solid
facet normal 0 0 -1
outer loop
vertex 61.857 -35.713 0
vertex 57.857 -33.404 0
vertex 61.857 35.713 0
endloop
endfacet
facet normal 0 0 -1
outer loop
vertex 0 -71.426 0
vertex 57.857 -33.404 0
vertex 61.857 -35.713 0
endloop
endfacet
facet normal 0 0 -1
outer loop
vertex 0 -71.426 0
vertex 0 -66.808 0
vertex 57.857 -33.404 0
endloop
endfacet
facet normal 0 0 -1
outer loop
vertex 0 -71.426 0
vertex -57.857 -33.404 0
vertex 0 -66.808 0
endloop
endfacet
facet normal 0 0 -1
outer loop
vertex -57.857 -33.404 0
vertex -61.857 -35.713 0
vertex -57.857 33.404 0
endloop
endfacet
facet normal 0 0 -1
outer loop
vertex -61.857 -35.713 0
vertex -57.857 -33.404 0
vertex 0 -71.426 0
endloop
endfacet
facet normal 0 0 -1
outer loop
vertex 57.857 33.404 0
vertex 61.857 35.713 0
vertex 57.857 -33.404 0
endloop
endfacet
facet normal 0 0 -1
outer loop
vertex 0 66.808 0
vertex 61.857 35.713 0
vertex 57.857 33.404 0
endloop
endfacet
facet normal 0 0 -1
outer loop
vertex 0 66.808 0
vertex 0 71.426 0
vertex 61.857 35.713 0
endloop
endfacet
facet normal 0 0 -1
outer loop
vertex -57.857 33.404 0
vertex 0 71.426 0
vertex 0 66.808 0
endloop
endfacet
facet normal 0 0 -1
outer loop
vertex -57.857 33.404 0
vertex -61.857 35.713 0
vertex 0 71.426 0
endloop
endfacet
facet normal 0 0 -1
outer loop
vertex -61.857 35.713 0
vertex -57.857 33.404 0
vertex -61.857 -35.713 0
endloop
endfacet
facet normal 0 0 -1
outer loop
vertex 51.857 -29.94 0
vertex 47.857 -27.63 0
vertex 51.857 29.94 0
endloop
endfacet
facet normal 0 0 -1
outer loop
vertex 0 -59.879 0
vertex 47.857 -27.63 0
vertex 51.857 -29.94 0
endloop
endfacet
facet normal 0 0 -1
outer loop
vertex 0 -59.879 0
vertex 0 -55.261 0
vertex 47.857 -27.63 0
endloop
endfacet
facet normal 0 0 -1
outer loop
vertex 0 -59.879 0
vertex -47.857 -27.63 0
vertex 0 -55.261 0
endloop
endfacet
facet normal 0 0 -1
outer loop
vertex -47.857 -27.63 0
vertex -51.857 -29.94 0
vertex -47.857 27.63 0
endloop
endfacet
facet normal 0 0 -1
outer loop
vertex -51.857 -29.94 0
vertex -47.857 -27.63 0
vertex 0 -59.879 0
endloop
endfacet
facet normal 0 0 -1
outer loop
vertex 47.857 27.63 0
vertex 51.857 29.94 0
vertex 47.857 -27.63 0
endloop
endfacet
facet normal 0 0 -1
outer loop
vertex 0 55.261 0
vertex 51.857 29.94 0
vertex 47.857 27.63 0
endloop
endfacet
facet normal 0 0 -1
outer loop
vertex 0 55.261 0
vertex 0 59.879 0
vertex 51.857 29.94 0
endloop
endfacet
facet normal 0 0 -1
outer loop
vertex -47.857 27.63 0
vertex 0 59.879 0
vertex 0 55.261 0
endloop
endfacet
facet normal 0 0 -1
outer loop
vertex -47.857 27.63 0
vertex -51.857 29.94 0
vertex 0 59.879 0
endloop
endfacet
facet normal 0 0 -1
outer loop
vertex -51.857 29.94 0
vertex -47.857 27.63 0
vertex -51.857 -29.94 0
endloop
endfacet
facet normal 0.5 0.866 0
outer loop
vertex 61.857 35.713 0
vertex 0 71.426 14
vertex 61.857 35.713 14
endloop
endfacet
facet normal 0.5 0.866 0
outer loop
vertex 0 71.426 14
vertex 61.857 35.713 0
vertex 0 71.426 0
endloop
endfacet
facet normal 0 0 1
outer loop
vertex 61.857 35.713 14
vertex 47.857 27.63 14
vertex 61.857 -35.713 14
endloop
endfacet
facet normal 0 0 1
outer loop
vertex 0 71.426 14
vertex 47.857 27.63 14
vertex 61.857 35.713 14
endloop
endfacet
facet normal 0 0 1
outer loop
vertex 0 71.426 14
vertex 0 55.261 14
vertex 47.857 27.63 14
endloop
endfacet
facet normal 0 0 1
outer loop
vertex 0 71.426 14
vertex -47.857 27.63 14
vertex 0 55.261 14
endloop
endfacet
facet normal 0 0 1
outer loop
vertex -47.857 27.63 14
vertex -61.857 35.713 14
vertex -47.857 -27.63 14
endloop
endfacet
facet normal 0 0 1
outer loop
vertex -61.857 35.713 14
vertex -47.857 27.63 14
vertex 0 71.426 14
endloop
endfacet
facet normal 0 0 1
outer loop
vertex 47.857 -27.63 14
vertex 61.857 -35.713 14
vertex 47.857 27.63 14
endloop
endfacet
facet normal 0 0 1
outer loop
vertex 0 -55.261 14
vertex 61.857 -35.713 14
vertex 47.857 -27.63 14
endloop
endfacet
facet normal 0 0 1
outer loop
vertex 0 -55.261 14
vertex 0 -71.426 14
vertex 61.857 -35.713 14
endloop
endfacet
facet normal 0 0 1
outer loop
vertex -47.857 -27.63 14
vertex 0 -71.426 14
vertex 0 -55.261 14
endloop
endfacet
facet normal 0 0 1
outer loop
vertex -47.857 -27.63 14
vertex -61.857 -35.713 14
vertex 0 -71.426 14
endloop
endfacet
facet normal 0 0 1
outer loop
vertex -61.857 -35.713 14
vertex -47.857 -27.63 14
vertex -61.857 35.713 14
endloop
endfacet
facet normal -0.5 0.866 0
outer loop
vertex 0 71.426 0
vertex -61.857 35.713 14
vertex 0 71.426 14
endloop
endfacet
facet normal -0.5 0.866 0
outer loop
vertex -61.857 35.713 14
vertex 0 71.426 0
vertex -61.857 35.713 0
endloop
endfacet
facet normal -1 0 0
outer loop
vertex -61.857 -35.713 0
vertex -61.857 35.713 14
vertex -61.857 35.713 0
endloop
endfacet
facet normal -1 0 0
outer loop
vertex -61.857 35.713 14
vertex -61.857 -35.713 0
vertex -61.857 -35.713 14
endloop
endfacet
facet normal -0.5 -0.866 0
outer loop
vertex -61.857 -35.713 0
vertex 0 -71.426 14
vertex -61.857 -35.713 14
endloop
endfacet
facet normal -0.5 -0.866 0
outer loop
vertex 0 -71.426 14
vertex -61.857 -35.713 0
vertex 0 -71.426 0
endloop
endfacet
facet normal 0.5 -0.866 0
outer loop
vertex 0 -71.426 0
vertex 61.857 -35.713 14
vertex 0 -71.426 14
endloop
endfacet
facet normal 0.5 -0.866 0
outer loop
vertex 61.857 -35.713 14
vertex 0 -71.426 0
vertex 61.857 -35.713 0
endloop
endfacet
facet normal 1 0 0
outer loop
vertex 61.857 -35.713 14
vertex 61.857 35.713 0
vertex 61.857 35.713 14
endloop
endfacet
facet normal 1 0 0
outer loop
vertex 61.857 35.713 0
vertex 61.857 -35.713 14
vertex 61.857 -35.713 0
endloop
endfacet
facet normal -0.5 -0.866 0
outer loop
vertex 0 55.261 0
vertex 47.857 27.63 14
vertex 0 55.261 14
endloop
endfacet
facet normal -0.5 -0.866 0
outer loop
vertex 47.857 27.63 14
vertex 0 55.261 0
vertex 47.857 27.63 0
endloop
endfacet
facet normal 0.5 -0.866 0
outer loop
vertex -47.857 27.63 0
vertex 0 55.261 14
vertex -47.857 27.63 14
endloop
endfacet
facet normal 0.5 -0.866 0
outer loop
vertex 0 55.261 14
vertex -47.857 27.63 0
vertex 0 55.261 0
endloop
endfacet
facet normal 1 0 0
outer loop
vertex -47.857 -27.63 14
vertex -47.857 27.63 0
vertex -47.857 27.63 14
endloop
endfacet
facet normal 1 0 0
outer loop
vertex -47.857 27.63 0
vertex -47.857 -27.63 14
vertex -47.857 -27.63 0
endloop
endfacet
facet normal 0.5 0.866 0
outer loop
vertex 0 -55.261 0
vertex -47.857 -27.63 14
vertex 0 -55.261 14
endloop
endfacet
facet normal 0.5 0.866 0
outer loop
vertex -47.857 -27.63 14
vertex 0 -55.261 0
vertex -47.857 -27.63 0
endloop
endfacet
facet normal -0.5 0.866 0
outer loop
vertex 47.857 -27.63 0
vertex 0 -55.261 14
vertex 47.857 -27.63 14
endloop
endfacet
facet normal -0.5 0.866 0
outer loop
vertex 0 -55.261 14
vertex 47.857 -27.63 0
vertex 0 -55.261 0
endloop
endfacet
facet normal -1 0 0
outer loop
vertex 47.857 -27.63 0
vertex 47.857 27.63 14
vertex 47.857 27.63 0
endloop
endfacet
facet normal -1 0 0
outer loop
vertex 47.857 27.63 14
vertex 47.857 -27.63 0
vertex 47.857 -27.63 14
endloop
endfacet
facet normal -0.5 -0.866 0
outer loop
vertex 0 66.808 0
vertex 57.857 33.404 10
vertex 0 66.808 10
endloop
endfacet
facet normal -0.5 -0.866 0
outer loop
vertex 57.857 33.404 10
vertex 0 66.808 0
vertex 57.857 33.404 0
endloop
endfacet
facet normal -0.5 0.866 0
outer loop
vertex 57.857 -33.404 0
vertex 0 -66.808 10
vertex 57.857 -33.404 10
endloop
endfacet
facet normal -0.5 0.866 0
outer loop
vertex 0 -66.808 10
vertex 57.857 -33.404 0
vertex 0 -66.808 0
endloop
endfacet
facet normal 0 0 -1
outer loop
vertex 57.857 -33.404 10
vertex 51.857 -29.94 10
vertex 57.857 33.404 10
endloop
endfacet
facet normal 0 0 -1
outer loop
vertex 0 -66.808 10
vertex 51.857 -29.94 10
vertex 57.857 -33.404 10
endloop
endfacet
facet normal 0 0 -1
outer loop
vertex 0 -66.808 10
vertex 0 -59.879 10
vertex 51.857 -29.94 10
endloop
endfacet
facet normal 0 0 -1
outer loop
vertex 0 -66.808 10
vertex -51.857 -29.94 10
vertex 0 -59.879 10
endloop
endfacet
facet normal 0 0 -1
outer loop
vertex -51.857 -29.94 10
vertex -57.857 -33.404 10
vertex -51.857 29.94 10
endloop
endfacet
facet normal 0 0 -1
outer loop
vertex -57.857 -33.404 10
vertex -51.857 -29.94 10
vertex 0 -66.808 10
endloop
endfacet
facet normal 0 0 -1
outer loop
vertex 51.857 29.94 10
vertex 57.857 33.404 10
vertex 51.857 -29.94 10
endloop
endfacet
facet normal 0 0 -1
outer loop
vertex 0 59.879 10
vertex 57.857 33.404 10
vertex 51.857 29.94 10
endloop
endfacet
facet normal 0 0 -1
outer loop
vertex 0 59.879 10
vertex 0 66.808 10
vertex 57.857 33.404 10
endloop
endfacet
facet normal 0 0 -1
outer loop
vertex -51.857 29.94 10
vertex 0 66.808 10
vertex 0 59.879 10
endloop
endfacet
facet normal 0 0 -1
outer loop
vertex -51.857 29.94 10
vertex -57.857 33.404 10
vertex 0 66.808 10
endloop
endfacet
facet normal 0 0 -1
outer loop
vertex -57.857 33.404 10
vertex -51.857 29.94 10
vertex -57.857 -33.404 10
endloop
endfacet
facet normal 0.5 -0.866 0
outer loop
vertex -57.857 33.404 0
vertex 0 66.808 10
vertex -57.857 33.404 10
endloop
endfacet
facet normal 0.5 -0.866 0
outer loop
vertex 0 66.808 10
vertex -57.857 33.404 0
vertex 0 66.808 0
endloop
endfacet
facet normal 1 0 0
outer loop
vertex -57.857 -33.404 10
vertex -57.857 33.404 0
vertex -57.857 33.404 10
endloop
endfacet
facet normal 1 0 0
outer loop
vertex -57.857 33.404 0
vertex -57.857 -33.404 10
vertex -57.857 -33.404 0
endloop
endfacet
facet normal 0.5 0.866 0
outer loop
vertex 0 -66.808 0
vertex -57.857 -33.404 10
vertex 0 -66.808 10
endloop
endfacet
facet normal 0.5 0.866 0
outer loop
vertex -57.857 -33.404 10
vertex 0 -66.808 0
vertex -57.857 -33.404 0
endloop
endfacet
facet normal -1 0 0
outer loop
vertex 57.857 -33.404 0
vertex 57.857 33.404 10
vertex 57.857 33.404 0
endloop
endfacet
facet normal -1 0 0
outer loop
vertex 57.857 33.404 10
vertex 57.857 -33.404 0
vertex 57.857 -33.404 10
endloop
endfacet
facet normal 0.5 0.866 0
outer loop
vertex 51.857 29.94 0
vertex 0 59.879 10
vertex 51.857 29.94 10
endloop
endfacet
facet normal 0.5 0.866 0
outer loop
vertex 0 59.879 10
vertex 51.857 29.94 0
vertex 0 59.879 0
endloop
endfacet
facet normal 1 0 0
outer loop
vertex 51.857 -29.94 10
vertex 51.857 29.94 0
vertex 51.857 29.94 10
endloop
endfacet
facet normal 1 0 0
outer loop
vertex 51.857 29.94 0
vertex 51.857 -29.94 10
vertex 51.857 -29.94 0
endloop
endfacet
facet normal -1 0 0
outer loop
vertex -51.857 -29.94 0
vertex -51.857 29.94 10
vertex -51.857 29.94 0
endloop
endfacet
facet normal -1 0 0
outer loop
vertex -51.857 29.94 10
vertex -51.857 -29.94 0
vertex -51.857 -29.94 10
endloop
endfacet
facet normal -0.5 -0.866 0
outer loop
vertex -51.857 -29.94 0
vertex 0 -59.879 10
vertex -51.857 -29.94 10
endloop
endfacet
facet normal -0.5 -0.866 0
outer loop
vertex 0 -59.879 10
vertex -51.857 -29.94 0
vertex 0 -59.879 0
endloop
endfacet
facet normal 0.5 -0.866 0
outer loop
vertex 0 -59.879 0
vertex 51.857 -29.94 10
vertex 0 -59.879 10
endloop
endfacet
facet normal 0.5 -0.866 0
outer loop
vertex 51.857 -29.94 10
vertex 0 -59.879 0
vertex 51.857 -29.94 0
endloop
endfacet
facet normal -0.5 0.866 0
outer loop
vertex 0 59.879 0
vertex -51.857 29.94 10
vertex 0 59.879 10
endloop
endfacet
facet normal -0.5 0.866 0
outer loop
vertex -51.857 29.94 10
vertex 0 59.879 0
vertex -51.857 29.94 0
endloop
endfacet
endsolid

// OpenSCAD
// file: lib/honeycomb.scad
/*
Author: Daniel <headbulb>
Small library to create a repeating honeycomb pattern around center hex grid
*/





module hexagon2d(initialangle=0, radius=1) {
polygon(points=[[radius*cos(initialangle),radius*sin(initialangle)],
				[radius*cos(initialangle+60),radius*sin(initialangle+60)],
				[radius*cos(initialangle+120),radius*sin(initialangle+120)],
				[radius*cos(initialangle+180),radius*sin(initialangle+180)],
				[radius*cos(initialangle+240),radius*sin(initialangle+240)],
				[radius*cos(initialangle+300),radius*sin(initialangle+300)]]);
}
// Number of cells = 1+summation(start=1, end=boundry, 6*n)
module hexagongrid(height=1, boundry=1, outerhexradius=1, innerhexradius=0.9, orientation=0, inneronly=true ) {
for (i = [-(boundry) : 1 :boundry ] ){
    for(j = [-(boundry) : 1 : boundry ]){
            z = -(i+j);
            if(z<boundry+1 && z>-(boundry+1)){
             //   echo("i:", i, "j:", j, "z:", z);
                x1 = outerhexradius*(i*cos(300+orientation)+j*cos(60+orientation)+z*cos(180+orientation));
                y1 = outerhexradius*(i*sin(300+orientation)+j*sin(60+orientation)+z*sin(180+orientation));
				if(inneronly==true){
					//color([abs(i)/5,abs(j)/5,abs(z)/5])
					translate([x1,y1,0])
					linear_extrude(height=height) 
					 hexagon2d(initialangle=orientation, radius=innerhexradius);
				}
				else {
						difference() {
							//color([abs(i)/5,abs(j)/5,abs(z)/5])
							translate([x1,y1,0])
							linear_extrude(height=height) 
							 hexagon2d(initialangle=orientation, radius=outerhexradius);
							translate([x1,y1,0])linear_extrude(height=height)
							 hexagon2d(initialangle=orientation, radius=innerhexradius);
					}
				
				}
            } //if Z
    }// for j
}// for i
}


// Find the radius of the outerhex. Basically find an edge hex center then two vectors from that point. 
// One vector to the corner, second vector a little outside that. A 120-30-30 or 30-60-90 triangle
function adj(s) = s/2;
function hyp(s) = adj(s)/cos(30);
function x2(s, boundry) = s*((boundry)*cos(0)-(boundry)*cos(240))+s*cos(60)+hyp(s)*cos(330);
function y2(s, boundry) = s*((boundry)*sin(0)-(boundry)*sin(240))+s*sin(60)+hyp(s)*sin(330);
function outerhexradius(s, boundry) = sqrt((x2(s, boundry)*x2(s, boundry)+y2(s, boundry)*y2(s, boundry)));
//outerhex=sqrt((x2*x2+y2*y2));
// main file
$fn = $preview ? 10 : 100;

include <lib/honeycomb.scad>

D = 10;
W = 810;
H = 542;

count_x = 7;
count_y = 5;

T = 12;

ohr = W/count_x/cos(30)/2;
delta_r = T/cos(30)/2;
ihr = ohr - delta_r;

jig_t = 4;
jig_r = jig_t/cos(30);

module grid() {
    difference() {
        union() {
            difference() {
                translate([-W/2,-H/2,0]) cube([W,H,D]);
                hexagongrid(height = D, boundry = max(count_x,count_y), outerhexradius = ohr, innerhexradius = ihr, orientation = 90, inneronly = true);
            }

            // frame
            translate([0,0,D/2])
            difference() {
                cube([W,H,D], center = true);
                cube([W-2*T,H-2*T,D], center = true);
            }
        }
        // hexagongrid(height = D-t/2, boundry = 1, outerhexradius = ohr/3+t/3, innerhexradius = t/2, orientation = 90, inneronly = true);
    }
}

module jig() {
    difference() {
        hexagongrid(height = D + jig_t, boundry = 0, outerhexradius = ohr+jig_r, innerhexradius = ihr-jig_r, orientation = 90, inneronly = false);
        hexagongrid(height = D, boundry = 0, outerhexradius = ohr, innerhexradius = ihr, orientation = 90, inneronly = false);
    }
}

// module part(n) {
//     i = n%3;
//     j = floor(n/3);
//     intersection() {
//         translate([-W/3 + i*W/3,-H/4 + j*H/2,0])
//                 grid();

//         translate([0,0,D/2])
//         cube([W/3,H/2,D], center = true);
//     }
// }

// grid();
// for (i = [0:5]) {
//     translate([0,0,i*2*D])
//     part(i);
// }

color("red") jig();

// 13 => 56.6429
// 12 => 57.0089
